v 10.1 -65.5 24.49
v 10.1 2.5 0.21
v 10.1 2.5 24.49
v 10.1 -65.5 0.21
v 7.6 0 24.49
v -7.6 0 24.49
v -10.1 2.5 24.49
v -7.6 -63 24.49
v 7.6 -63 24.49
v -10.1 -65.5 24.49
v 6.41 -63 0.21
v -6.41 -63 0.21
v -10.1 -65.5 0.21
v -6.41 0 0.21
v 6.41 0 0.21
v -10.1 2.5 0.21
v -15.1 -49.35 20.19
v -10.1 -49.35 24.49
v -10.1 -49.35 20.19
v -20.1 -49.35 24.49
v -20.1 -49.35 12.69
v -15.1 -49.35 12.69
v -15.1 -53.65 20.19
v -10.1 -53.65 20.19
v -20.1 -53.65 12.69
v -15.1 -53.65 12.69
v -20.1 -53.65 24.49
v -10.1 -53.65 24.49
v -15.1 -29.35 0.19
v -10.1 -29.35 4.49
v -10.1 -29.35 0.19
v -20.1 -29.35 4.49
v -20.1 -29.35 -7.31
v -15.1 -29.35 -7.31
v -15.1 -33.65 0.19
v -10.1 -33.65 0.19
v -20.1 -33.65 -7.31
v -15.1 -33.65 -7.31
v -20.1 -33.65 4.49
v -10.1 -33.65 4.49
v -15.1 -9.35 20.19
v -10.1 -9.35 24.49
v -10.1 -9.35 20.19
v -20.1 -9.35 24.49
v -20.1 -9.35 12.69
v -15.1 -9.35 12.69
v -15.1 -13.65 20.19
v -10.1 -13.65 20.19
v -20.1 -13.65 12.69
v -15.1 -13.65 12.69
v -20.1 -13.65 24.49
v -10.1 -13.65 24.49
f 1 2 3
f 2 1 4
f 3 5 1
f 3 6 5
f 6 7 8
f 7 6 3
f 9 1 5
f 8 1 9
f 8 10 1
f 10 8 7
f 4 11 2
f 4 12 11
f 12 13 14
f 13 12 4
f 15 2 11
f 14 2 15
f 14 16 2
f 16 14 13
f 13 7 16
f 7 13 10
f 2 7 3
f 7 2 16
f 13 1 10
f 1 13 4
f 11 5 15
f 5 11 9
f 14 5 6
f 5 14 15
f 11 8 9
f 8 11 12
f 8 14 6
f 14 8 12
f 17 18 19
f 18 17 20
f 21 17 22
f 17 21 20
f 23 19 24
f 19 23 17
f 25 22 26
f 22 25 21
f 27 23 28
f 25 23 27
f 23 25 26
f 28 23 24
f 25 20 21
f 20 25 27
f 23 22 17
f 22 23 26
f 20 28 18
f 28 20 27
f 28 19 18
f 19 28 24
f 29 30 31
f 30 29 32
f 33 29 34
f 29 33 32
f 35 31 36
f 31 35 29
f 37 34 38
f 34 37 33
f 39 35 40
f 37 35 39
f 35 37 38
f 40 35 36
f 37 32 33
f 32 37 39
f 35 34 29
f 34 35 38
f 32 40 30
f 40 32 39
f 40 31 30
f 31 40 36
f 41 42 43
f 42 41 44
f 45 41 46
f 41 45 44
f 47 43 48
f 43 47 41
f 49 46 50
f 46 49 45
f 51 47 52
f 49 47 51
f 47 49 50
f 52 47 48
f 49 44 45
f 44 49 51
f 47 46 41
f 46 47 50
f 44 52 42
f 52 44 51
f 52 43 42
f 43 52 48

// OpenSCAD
// file: ../../modules/skadis.scad
ikea_skadis_hole_w = 4.3;
ikea_skadis_hook_depth = 5;
ikea_skadis_hole_h = 7.5;
ikea_skadis_holes_dist = 80;
ikea_skadis_holes_horiz_dist = 40;

module skadis_hook() {
    color("green")
    translate([0,ikea_skadis_hook_depth,-ikea_skadis_hole_h]) cube([ikea_skadis_hole_w,ikea_skadis_hook_depth,ikea_skadis_hole_h ]);

    color("violet")
    translate([0,0,0]) cube([ikea_skadis_hole_w,ikea_skadis_hook_depth*2,ikea_skadis_hole_w ]);
}

module skadis_double_hooks() {
    skadis_hook();
    
    translate([0,0,ikea_skadis_holes_dist]) skadis_hook();
    
    color("yellow")
    translate([0,-ikea_skadis_hook_depth,0])
    cube([ikea_skadis_hole_w,ikea_skadis_hook_depth,ikea_skadis_holes_dist + ikea_skadis_hole_w]);
}

module skadis_triple_horiz_hooks() {
    translate([-20 - ikea_skadis_hole_w / 2,0,0]) union() {
        skadis_hook();
        translate([20,0,-20]) skadis_hook();
        translate([40,0,0]) skadis_hook();
    }
}

//skadis_double_hooks();
//skadis_triple_horiz_hooks();
// main file
include <../../modules/skadis.scad>;


w_min = 12.8;
w_max = 15.2;
h = 24.5;
d = 63;
delta = 0.01;
thick = 5;

difference() {
    translate([-(w_max + thick)/2,-d - thick / 2,delta+0.2]) cube([w_max + thick,d + thick, h-delta*2-0.2]);

    rotate([90,0,0]) linear_extrude(height = d) {
        polygon(points = [[-w_min/2, 0], [-w_max/2, h], [w_max/2, h], [w_min/2, 0]]);
    }
}

translate([-(w_max + thick) / 2,-d/2,h-delta-ikea_skadis_hole_w]) rotate([0,0,90]) skadis_triple_horiz_hooks();
